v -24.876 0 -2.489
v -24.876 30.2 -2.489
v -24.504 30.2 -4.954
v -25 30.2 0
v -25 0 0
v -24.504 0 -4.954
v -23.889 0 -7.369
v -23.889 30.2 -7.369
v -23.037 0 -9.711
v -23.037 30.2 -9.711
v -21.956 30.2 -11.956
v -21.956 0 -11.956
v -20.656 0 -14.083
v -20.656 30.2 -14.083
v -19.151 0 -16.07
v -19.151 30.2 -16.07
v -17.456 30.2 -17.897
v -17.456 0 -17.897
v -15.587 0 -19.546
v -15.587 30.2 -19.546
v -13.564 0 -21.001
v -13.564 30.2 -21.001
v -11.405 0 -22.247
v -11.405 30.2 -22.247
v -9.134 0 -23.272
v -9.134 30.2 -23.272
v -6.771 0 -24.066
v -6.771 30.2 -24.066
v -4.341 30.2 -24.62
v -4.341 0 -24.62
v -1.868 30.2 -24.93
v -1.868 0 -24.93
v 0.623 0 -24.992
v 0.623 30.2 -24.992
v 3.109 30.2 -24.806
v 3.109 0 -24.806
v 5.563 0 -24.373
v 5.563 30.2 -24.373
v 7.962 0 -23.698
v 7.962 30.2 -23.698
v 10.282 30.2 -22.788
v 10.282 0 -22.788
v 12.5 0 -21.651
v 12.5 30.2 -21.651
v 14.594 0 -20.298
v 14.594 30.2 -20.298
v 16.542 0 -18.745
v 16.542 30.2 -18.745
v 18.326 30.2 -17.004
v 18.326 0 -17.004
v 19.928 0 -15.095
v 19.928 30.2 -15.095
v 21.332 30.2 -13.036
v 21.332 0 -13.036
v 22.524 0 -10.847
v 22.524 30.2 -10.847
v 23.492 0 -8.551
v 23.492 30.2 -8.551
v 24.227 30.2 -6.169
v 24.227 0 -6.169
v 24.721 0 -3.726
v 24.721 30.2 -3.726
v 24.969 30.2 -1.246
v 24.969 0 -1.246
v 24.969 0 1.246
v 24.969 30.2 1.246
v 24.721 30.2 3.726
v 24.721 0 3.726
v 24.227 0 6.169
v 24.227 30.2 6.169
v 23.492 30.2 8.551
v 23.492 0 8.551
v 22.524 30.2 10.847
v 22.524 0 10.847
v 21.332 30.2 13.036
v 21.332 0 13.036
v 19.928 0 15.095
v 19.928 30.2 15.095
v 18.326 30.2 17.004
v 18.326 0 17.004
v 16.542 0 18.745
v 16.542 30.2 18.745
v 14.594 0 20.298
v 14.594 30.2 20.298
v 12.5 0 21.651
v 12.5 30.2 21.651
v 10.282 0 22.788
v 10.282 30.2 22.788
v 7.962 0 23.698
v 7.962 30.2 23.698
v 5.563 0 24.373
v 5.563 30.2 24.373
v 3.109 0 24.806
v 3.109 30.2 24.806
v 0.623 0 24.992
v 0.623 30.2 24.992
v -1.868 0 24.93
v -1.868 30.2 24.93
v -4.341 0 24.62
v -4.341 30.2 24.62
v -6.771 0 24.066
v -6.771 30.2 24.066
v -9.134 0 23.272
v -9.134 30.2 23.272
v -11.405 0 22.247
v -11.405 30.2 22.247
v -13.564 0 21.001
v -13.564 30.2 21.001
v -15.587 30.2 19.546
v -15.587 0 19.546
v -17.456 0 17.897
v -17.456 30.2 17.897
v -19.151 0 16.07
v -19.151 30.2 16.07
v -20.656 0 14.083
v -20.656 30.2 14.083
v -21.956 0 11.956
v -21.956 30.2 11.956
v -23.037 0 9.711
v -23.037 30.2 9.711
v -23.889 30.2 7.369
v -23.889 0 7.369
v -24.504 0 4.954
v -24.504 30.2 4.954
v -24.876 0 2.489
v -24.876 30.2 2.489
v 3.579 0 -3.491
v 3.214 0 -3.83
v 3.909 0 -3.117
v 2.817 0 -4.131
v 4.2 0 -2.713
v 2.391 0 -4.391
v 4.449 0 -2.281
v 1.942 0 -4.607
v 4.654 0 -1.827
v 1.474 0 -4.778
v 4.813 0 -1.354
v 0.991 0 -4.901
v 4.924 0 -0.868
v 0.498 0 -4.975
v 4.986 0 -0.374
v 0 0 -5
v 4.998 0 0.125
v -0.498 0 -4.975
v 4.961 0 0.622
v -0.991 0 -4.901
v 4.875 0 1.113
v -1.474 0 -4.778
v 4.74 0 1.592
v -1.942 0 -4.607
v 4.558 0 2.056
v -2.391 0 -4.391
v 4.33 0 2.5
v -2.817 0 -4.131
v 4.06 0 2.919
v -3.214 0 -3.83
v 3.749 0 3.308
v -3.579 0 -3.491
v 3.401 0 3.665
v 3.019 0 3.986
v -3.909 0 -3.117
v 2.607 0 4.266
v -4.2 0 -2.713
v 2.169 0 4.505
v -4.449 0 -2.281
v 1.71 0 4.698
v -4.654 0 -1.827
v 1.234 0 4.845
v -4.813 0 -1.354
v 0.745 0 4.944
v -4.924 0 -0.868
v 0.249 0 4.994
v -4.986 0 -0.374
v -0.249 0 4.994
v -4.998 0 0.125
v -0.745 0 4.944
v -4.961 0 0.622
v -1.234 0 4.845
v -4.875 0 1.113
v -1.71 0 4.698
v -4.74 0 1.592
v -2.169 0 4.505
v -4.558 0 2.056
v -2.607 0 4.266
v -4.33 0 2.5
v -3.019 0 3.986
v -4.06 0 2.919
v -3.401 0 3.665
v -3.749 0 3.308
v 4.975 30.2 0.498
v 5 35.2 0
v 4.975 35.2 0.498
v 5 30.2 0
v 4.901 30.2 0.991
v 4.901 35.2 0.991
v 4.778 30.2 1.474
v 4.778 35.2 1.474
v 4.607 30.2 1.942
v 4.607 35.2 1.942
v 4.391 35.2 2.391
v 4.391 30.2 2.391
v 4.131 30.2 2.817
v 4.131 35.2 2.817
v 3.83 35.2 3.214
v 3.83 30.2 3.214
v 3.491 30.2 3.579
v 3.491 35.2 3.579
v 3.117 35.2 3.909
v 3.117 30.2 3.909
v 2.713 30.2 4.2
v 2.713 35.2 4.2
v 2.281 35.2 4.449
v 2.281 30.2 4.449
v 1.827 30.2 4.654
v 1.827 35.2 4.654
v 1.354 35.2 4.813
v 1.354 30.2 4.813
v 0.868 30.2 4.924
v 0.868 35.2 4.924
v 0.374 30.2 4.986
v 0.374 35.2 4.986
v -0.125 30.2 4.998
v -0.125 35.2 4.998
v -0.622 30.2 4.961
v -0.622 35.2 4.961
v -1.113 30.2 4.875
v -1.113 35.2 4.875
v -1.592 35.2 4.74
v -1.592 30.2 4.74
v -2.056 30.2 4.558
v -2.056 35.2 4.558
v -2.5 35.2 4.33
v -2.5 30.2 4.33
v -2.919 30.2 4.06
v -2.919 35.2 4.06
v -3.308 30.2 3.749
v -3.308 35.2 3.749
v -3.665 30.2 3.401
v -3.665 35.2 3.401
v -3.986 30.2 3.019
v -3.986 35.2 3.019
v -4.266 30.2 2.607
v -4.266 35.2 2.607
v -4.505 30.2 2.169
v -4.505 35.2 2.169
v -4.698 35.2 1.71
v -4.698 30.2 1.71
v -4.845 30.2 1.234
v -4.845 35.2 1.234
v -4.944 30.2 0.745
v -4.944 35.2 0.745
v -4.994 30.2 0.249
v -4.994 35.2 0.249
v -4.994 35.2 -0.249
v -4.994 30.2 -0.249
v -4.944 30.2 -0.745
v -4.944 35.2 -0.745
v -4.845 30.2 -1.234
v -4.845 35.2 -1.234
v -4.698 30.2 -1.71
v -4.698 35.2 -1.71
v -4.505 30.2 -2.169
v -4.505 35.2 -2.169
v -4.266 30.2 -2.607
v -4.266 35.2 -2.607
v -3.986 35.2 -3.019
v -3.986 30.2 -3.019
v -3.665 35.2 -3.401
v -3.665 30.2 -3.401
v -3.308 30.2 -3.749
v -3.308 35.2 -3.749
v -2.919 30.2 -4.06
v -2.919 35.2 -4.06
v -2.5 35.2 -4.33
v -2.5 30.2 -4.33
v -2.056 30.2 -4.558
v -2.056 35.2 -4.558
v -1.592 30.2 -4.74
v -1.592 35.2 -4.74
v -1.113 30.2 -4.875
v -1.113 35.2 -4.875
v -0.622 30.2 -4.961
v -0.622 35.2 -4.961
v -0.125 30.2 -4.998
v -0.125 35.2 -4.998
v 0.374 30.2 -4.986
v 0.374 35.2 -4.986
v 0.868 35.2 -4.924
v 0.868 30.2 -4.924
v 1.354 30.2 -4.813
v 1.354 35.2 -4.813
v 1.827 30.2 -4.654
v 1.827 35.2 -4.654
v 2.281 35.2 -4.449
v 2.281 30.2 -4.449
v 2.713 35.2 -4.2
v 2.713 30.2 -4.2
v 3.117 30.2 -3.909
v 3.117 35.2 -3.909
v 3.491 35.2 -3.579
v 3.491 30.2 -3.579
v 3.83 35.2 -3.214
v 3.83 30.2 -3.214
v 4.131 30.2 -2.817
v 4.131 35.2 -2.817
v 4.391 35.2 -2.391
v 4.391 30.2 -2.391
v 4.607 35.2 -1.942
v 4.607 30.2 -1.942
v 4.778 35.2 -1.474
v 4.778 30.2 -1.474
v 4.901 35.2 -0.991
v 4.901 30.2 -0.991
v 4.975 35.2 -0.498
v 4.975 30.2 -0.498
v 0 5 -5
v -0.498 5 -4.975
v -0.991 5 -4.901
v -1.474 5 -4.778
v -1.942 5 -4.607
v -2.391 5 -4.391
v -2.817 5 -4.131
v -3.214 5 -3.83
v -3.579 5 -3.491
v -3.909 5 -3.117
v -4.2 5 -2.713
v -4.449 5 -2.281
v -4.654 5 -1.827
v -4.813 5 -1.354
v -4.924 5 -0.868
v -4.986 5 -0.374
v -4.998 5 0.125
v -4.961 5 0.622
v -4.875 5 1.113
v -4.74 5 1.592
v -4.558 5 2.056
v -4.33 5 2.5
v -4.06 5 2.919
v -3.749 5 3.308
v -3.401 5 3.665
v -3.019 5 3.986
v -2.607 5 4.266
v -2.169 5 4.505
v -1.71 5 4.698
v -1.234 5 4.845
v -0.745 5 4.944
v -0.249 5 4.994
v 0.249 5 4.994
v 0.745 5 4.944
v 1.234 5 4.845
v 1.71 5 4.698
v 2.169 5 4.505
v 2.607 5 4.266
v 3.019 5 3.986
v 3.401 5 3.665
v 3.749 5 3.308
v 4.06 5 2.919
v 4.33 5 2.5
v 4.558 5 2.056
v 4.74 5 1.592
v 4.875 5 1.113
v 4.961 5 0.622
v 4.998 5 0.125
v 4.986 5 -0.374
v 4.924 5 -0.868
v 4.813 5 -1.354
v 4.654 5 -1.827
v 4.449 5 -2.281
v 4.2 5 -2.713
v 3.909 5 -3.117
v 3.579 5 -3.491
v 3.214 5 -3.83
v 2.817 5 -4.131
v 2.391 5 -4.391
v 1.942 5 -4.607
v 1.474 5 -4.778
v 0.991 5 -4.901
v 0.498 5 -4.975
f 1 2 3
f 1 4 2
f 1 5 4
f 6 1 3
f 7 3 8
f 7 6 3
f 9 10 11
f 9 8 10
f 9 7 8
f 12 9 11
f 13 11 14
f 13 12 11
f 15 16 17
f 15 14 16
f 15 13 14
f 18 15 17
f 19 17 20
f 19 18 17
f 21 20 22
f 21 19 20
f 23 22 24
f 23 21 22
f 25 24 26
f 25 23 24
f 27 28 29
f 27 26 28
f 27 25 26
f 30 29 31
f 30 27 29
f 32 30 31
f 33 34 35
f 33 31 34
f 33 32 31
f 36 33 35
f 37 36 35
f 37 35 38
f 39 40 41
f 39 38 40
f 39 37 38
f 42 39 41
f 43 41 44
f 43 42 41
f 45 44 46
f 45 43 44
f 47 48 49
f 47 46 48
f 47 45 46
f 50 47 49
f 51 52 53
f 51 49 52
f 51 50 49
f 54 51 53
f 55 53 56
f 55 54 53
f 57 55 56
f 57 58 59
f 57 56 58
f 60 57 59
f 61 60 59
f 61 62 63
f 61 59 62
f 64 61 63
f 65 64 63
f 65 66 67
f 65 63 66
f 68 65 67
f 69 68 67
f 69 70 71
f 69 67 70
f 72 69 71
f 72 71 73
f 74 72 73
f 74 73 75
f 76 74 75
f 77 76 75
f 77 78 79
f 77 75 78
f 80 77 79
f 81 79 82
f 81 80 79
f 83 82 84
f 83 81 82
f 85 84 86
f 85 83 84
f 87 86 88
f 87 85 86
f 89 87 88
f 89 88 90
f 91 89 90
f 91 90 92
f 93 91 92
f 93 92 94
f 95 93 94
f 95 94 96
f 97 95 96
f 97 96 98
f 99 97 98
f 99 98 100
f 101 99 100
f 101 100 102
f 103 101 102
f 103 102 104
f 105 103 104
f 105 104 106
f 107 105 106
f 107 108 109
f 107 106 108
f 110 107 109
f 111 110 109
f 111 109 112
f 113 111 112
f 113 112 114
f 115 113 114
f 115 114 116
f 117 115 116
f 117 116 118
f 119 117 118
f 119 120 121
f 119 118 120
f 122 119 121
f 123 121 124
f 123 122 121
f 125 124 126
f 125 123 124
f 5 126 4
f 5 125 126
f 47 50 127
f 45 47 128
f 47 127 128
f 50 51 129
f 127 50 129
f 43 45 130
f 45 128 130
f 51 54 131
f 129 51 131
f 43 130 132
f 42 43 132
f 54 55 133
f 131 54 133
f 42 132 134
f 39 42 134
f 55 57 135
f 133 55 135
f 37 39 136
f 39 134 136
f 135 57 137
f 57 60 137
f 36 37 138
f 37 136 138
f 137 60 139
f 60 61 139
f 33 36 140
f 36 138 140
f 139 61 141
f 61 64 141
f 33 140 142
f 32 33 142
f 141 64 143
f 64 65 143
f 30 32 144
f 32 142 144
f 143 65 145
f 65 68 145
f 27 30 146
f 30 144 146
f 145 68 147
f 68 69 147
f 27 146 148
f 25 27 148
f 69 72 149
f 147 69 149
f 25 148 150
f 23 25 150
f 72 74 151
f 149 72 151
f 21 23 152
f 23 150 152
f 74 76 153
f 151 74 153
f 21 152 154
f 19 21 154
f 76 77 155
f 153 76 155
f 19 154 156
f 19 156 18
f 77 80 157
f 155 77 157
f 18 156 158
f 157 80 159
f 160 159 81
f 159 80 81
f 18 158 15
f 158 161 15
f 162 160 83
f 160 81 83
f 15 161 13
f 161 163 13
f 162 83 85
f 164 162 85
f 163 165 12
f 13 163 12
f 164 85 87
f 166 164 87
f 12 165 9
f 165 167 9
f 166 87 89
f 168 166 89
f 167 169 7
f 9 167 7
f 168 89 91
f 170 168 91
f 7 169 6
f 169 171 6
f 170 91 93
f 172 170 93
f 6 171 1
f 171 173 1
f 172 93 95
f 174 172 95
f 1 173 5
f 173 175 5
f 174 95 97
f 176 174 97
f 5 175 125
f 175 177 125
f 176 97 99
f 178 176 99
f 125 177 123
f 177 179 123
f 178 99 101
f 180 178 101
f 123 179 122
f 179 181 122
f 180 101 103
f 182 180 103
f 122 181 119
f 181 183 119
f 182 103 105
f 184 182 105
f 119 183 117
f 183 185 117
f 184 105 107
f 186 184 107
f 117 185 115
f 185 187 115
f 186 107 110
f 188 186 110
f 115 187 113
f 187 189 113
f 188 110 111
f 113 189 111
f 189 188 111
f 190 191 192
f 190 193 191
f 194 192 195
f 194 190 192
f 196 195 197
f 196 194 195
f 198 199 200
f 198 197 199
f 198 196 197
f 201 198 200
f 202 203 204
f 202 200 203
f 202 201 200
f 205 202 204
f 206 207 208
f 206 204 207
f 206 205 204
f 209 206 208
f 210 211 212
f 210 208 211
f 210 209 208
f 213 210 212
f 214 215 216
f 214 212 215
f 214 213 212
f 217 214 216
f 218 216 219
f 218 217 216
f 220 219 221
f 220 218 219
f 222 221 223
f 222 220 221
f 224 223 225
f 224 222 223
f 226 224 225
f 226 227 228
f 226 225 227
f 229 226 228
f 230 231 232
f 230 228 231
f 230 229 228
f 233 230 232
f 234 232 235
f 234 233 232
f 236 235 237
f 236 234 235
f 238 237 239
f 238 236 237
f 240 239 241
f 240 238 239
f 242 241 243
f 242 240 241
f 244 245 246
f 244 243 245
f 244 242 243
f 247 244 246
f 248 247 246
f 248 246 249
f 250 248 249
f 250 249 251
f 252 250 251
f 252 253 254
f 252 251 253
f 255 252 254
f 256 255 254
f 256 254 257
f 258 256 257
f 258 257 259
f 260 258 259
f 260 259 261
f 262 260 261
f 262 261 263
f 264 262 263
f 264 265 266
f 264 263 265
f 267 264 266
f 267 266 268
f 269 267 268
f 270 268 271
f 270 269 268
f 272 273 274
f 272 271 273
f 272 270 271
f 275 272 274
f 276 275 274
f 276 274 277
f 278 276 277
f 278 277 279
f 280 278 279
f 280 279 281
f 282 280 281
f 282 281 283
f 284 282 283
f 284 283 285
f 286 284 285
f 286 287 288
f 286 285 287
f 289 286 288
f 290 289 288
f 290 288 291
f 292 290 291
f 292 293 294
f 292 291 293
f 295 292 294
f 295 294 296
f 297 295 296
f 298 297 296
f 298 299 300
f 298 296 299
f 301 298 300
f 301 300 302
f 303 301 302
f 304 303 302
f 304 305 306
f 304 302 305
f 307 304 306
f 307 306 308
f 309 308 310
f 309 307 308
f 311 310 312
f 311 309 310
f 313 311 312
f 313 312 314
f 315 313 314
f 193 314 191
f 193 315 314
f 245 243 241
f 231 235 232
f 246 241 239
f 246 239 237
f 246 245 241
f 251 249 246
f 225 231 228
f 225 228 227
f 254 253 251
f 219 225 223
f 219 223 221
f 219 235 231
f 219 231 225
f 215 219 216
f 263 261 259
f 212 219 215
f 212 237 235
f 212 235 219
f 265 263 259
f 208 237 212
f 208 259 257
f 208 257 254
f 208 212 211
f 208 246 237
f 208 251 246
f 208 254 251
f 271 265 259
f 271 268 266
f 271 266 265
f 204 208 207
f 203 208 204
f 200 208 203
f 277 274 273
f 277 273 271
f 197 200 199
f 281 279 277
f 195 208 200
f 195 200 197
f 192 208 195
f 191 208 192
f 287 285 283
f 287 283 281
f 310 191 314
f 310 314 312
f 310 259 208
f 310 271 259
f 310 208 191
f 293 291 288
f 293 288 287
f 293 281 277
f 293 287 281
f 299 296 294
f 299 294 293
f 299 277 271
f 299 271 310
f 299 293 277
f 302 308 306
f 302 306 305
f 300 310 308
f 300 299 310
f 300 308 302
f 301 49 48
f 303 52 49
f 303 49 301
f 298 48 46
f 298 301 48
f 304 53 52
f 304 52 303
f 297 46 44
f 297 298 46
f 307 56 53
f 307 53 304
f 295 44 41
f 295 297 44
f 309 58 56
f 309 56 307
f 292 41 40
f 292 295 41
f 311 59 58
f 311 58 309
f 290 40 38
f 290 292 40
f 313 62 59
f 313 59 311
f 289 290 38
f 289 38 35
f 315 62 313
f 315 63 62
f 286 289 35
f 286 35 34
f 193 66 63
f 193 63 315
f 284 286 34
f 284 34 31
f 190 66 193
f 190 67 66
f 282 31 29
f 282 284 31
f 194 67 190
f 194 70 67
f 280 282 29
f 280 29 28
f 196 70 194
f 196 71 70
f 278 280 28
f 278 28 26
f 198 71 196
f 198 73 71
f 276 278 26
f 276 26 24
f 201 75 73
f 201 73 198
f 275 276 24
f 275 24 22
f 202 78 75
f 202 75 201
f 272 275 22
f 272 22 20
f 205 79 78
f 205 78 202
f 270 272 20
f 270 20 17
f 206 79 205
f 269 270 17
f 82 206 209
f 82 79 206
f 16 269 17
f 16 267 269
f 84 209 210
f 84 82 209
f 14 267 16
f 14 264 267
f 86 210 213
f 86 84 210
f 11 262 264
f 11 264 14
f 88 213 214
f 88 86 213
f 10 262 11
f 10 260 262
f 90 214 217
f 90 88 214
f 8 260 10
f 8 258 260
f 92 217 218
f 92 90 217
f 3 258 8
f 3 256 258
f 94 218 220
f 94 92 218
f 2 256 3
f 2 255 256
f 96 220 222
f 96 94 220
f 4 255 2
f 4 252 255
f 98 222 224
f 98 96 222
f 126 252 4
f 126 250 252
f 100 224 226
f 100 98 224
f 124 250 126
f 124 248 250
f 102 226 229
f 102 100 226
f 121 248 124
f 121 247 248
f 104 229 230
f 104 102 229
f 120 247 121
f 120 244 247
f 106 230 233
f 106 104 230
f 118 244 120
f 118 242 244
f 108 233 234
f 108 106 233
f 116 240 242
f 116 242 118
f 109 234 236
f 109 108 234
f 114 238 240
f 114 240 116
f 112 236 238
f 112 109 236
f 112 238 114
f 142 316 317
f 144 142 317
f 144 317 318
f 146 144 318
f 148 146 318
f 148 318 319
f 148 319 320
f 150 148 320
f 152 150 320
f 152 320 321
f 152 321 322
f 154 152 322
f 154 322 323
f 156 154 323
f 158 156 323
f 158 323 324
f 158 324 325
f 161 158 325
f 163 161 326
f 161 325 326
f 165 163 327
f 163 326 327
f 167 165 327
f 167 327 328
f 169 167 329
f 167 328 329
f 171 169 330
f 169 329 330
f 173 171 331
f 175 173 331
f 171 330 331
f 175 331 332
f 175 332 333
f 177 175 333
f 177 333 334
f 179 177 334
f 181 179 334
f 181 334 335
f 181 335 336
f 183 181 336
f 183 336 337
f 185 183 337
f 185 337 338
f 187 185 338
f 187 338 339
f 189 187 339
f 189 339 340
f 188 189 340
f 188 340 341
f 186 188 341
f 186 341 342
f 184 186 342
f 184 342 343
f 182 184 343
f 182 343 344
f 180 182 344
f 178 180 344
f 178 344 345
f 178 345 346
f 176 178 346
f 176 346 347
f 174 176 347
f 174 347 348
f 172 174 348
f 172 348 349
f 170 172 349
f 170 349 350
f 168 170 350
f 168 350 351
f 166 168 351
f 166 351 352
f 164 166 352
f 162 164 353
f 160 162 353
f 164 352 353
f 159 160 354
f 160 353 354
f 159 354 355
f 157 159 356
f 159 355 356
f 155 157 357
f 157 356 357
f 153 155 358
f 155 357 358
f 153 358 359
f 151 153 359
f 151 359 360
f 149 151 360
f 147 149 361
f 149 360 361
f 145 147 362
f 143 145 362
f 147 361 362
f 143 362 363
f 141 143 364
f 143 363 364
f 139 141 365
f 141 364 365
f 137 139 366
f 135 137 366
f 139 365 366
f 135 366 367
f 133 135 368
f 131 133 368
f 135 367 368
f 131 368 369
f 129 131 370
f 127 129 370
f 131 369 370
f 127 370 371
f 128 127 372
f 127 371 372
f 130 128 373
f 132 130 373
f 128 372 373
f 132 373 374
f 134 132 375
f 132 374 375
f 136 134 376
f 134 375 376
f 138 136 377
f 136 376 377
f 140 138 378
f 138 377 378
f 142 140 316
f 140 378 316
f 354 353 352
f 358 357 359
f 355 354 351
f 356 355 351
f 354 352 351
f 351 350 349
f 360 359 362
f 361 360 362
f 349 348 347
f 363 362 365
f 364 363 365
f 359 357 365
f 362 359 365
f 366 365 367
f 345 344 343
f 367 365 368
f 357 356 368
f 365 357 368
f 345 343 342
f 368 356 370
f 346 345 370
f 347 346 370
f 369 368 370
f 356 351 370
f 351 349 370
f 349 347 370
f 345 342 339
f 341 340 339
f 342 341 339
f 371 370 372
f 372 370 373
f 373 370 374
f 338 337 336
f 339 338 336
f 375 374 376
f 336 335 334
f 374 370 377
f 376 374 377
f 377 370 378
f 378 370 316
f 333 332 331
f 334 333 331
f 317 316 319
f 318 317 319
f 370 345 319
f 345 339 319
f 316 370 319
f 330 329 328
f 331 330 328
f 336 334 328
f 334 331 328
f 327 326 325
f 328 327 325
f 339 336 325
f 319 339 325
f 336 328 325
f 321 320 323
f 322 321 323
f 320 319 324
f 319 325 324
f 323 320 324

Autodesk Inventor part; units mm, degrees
ref_plane "YZ Plane" through (0, 0, 0) normal (1, 0, 0) x (0, 1, 0)
ref_plane "XZ Plane" through (0, 0, 0) normal (0, 1, 0) x (-1, 0, 0)
ref_plane "XY Plane" through (0, 0, 0) normal (0, 0, 1) x (1, 0, 0)
sketch "Sketch1" plane through (0, 0, 0) normal (0, 1, 0) x (-1, 0, 0)
  circle A0 centre (0, 0) radius 25
  dimension "d0" = 50
extrude "Extrusion1" add sketch "Sketch1" along normal blind 30.2
hole "Hole1" at (0, 0, 0) direction (0, 1, 0) diameter 10 depth 5
sketch "Sketch2" plane through (0, 30.2, 0) normal (0, 1, 0) x (1, 0, 0)
  circle A0 centre (0, 0) radius 5
extrude "Extrusion2" add sketch "Sketch2" along normal blind 5
properties part number "stackLightElement" material "Polycarbonate, Clear"
